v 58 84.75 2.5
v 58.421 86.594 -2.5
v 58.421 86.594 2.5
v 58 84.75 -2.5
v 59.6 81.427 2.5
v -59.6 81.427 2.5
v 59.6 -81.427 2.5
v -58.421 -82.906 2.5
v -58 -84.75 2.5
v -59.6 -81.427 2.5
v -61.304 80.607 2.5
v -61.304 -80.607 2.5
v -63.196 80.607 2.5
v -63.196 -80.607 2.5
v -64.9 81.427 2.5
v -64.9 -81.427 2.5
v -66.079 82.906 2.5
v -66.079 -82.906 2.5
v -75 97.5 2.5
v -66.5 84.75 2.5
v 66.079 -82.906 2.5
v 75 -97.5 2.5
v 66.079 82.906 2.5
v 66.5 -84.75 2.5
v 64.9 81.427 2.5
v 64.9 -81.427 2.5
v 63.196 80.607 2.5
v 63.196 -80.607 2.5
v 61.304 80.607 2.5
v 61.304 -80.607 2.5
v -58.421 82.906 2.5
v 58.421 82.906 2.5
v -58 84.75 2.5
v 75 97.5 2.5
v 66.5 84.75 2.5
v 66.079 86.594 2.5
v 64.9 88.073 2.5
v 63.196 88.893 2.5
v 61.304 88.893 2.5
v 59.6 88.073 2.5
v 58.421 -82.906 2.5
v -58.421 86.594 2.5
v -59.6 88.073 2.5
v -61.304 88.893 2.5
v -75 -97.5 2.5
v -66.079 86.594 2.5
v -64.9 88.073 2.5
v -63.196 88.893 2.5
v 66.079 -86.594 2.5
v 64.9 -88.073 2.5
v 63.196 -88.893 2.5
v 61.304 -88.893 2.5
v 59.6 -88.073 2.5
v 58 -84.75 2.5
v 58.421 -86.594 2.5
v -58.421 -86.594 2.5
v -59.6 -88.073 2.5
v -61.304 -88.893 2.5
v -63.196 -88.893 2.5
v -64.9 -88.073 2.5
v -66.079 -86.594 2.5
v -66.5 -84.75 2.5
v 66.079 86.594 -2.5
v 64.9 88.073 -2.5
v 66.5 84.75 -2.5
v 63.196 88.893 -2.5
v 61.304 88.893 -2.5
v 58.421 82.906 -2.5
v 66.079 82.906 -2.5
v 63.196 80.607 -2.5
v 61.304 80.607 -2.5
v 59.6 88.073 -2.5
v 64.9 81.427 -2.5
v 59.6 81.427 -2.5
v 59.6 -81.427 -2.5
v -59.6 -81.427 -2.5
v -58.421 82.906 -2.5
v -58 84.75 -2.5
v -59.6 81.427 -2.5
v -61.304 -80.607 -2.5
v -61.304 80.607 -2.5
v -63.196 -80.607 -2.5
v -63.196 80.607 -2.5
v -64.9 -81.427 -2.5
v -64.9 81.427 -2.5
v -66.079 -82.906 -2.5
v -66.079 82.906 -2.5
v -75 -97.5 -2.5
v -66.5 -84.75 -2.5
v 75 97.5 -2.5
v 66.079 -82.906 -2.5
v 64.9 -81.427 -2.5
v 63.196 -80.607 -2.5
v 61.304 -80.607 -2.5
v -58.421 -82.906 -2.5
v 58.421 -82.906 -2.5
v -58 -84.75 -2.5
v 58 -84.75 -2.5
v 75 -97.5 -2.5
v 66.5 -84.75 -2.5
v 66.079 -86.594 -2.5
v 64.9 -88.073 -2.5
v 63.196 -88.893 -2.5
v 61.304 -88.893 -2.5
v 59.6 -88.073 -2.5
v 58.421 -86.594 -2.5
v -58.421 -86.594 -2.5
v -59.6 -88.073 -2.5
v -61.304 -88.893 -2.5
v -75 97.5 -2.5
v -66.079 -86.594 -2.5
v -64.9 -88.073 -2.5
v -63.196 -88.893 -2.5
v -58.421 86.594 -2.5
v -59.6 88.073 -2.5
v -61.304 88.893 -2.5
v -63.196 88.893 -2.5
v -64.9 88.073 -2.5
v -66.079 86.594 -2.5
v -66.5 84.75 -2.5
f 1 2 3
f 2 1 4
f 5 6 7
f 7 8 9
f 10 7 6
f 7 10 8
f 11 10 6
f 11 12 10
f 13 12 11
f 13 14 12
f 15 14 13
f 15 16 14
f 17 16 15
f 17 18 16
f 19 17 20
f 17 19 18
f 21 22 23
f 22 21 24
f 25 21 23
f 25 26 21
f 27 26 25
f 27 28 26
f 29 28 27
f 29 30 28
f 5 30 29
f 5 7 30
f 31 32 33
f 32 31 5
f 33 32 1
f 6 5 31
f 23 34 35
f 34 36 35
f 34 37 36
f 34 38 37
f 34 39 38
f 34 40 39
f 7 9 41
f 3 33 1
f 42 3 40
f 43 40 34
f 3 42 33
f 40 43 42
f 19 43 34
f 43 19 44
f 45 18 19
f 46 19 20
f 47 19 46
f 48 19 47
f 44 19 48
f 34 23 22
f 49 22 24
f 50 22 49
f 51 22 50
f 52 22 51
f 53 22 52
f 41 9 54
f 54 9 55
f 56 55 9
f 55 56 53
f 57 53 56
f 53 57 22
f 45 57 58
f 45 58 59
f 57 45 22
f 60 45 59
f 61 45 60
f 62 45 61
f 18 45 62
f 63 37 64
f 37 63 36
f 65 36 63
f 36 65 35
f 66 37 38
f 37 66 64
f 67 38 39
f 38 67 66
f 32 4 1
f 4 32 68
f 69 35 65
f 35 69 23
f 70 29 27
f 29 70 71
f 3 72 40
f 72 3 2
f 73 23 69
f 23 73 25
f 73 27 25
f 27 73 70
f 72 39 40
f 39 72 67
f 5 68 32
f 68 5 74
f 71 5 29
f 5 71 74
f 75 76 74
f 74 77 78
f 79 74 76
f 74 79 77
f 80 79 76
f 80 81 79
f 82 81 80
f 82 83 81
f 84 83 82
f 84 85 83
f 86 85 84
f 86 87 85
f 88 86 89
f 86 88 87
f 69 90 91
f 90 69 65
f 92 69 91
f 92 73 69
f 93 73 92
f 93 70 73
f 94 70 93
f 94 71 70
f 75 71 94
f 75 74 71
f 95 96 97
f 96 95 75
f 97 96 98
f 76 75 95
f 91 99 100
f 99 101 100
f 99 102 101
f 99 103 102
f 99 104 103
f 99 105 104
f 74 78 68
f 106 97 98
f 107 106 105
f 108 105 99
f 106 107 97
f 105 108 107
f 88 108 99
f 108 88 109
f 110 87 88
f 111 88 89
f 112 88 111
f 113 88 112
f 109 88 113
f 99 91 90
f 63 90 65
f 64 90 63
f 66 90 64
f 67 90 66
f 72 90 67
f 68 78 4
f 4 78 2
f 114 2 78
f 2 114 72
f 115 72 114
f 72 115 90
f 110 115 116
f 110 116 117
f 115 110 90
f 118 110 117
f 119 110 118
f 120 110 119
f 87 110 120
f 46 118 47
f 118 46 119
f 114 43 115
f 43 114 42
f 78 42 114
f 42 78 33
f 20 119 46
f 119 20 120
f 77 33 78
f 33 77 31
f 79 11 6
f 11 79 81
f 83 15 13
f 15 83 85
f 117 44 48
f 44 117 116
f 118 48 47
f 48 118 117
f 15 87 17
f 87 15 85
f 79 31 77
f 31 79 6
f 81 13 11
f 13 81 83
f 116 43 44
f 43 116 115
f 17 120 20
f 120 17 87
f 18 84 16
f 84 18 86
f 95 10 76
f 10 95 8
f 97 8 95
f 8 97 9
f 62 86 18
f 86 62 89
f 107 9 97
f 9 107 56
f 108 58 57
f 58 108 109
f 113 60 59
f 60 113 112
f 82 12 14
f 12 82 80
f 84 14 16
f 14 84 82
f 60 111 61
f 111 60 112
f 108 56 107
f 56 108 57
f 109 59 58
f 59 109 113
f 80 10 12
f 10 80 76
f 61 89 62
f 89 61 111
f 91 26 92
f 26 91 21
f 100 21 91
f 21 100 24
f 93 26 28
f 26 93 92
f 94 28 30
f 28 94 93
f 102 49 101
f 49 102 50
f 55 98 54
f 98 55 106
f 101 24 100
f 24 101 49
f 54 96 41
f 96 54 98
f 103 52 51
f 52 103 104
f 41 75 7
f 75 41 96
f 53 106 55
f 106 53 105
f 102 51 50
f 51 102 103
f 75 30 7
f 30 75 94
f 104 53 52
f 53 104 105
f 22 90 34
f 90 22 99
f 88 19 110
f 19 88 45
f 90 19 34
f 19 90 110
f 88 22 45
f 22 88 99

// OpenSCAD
// Generated by SolidPython 1.1.3 on 2024-06-19 00:59:38


difference() {
	cube(center = true, size = [150, 195.0000000000, 5]);
	union() {
		translate(v = [62.2500000000, 84.7500000000]) {
			cylinder(center = true, h = 5, r = 4.2500000000);
		}
		translate(v = [-62.2500000000, 84.7500000000]) {
			cylinder(center = true, h = 5, r = 4.2500000000);
		}
		translate(v = [-62.2500000000, -84.7500000000]) {
			cylinder(center = true, h = 5, r = 4.2500000000);
		}
		translate(v = [62.2500000000, -84.7500000000]) {
			cylinder(center = true, h = 5, r = 4.2500000000);
		}
	}
}
/***********************************************
*********      SolidPython code:      **********
************************************************
 
import solid
import numpy as np
import numbers
import pudb
from solid.utils import *
import viewscad
import subprocess
import os
import os.path as osp
import math
import sys

chamfer_extrude=solid.import_scad("./chamfer_extrude.scad")
chamfer_extrude=chamfer_extrude.chamfer_extrude
r = viewscad.Renderer(width=800, height=800)

def debug(model,f_name,path="/home/ts/code/projects/mfd/designs/debug"):
    solid.scad_render_to_file(model,osp.join(path,f_name)+".scad")
#generate position list of wells using offset from center
wells_pos_from_center_4 = lambda offset: [[-offset,offset],
                                        [offset, offset],
                                        [-offset, -offset],
                                        [offset, -offset]]
wells_pos_from_center_2 = lambda offset: [[offset,0],
                                        [-offset,0]]

def make_well(dims,shape=None,height=None,dxf=False):
    def circle_cylinder():
        if dxf or (height is None):
            well = solid.circle(r=dims, segments=64)
        else:
            well = solid.cylinder(r=dims, h=height, segments=64, center = True)
        return well
    if dims is None:
        sys.exit("radius needs to be a number")
    if isinstance(dims, numbers.Number):
        well =circle_cylinder()
    elif len(dims)==1:
        if isinstance(dims[1], numbers.Number):
            well =circle_cylinder()
        else:
            sys.exit("radius needs to be a number")
    elif len(dims)==2:
        well = solid.square(dims,center = True)
    elif len(dims)==3:
        well = solid.cube(dims, center = True)
    return well

def wells_top_bottom(center_gap,device_dims=None,shape=None,height=None, positions = None, dxf = False,well_shape=None):
    if well_shape == None:
        well_shape = make_well(device_dims,shape=shape,height=height,dxf=dxf)
    wells = []
    if positions is None:
        offset = radius+radius/2.0
        positions = wells_pos_from_center_2(offset)
    if dxf or (height is None):
        height = 0
    for position in positions:
        if dxf:
            wells.append(solid.translate([position[0],position[1]])(well_shape))
        else:
            wells.append(solid.translate([position[0],position[1],height/2.0])(well_shape))
    return  union()(*wells)

#place wells in four corners 
def four_corner(radius,height=None, positions = None, dxf = False):
    #if well pos not specified set
    #to equally spaced by half radius
    if positions is None:
        offset = radius+radius/2.0
        positions = wells_pos_from_center_4(offset)
    if dxf or (height is None):
        height = 0
    #make wells at positions with specified radius and height
    wells = []
    for position in positions:
        #make circle if making dxf
        if dxf:
            well_shape = solid.circle(r=radius, segments=64)
            well_shape = solid.translate([position[0],position[1]])(well_shape)
        #if stl make cylinder
        else:
            well_shape = solid.cylinder(r=radius, h=height, segments=64, center = True)
            well_shape = solid.translate([position[0],position[1],height/2.0])(well_shape)
        wells.append(well_shape)
    return  union()(*wells)

#generate channels 
def make_channels(length,width,height=0,num_chans=1,max_chans=None,spacing=None, dxf = False,
                  rotate_channels=False):
    if dxf or (height is None):
        height = 0
    #if channel gap not defined, is equal to
    if spacing is None: spacing = width
    #calculate number of channels if fitting max num within given width
    if not max_chans is None:
        import math
        num_chans = math.floor((max_chans-spacing)/(width+spacing))
    #get total width of channel section  
    total_width = (width*num_chans)+(spacing*(num_chans-1))

    #make template channel
    #if rotate_channels: width, length = length, width
    if dxf:
        channel_t = solid.square([length,width],center = True)
    else:
        channel_t = solid.cube([length,width,height], center = True)

    #if number channels is even, offset the first channel to center its gap
    if num_chans % 2 == 0: centering = -(width/2.0+spacing/2.0)
    else: centering = 0
    #move template channel up to align bottom at z = 0 
    #and offset center if necessary
    if dxf:
        channel_t = solid.translate([0,centering])(channel_t)
    else:
        channel_t = solid.translate([0,centering,height/2.0])(channel_t)

    #if rotate_channels: length,width = width,length
    #start making the channels
    channels = []
    for i in range(num_chans):
        #if i=0 there is no translation
        #if i=1, we make the first channel adjacent to second
        direction = i

        #if i>=1, we add channels alternating left and right
        if i >= 1:
            direction = -(i/2.0)
            if i % 2 == 1: direction = (-direction)+0.5
                
        #make channel at right position and add it to channel list
        translation_coords = [0,direction*(width+spacing)]
        #if rotate_channels: translation_coords = [direction*(width+spacing),0]
        if dxf:
            channel = solid.translate(translation_coords)(channel_t)
        else:
            channel = solid.translate([*translation_coords,0])(channel_t)
        channels.append(channel)
    
    #group all channels as one object
    channels = union()(*channels)
    #compute the x,y,z dimensions in order to pass as arguments 
    #for construction of other parts of device (such as the chambers)
    measurements = {'x':(length/2.0,-length/2.0),
                    'y':(total_width/2.0,-total_width/2.0)}
    if not dxf:
        measurements['z'] = (height,0)
    if rotate_channels:
        channels = solid.rotate(90)(channels)
        measurements['x'],measurements['y']=measurements['y'],measurements['x']
    return channels,measurements

def make_chambers(msrs,height=None,extra=0,len_until=None,width=None, dxf = False):
    #computes x,y,z length
    total = lambda x : abs(x[0]) + abs(x[1])
    
    #if specific height if specified
    #otherwise use same height as channels
    if dxf:
        pass
    elif not height is None:
        msrs['z'] = (height,0)
    else:
        msrs['z'] = (0,0)
        
    #make copy of measurements from channels to modify chamber dimensions 
    #and add length to chambers as specified
    chamber_dims = msrs.copy()
    #calculate length of chamber to reach specified offset
    if not len_until is None:
        chamber_len = len_until-(msrs['x'][0])
    #or add specified length to channel length (if not specified, adds 0)
    else:
        chamber_len = msrs['x'][0]+extra
    #set the chamber length based 
    chamber_dims['x'] = (chamber_len/2.0,-(chamber_len/2.0))
    #compute final dimensions of chamber
    if not width is None:
        chamber_dims['y'] = (width/2.0,-width/2.0)
    chamber_dims = [total(size) for size in chamber_dims.values()]
        
    #calculate chamber translation offset to place adjacent to channels
    chamber_trslt = msrs['x'][0]+(chamber_len/2.0)
    #compute chamber translation coordinates to align with channels
    #x = 1 moves chamber above channels
    #x = -1 moves chamber below channels
    if dxf:
        trslt = lambda x : [x*(chamber_trslt),0]
    else:
        trslt = lambda x : [x*(chamber_trslt),0,msrs['z'][0]/2.0]
    
    #function to make chamber at top or at bottom 
    if dxf:
        move = lambda x : solid.translate(trslt(x))(solid.square(chamber_dims, center = True) )
    else:
        move = lambda x : solid.translate(trslt(x))(solid.cube(chamber_dims,center = True))
    #make top and bottom chambers and return them as grouped
    top = move(1)
    bottom = move(-1)
    #chambers=solid.rotate(90)(solid.union()(top,bottom))
    chambers=(solid.union()(top,bottom))

    return chambers

#create alignment features 
def alignment_features(unit,dims,grid_size, mask_size = None, alignment = "hollow", units_from_center = (2.5,2.5), corner_len=None):
    width = grid_size[0]*dims[0]
    length = grid_size[1]*dims[1]
    if mask_size is None and corner_len is None:
        corner_len = (dims[0] + dims[1]) /2 / 8
    corner = lambda thickness_div : solid.union()( solid.square([corner_len,corner_len/thickness_div],center=False), solid.square([corner_len/thickness_div,corner_len],center=False) )
    
    def make_full(thickness_div):
        thickness = corner_len/thickness_div
        tr = solid.translate([0, 0, 0 ])(solid.rotate(180)(corner(thickness_div)))
        tr = solid.translate([thickness/2,thickness/2,0])(tr)
        bl = solid.translate([0, 0, 0 ])(solid.rotate(0)(corner(thickness_div)))
        bl = solid.translate([-thickness/2,-thickness/2,0])(bl)
        return solid.union()(tr,bl)
    
    def make_hollow(thickness_div):
        thickness = corner_len/(thickness_div/2)
        inner = make_full(thickness_div)
        outer = make_full(thickness_div/2)
        hollow = outer - inner 
        return hollow
    
    center = (width /2 , length/2)
    mask_pos = lambda x,y : (center[0] + x*(float(units_from_center[0])*dims[0]), center[1] + y*(float(units_from_center[1])*dims[1]))
    positions = []
    positions.append(mask_pos(1,0))
    positions.append(mask_pos(0,1))
    positions.append(mask_pos(-1,0))
    positions.append(mask_pos(0,-1))
    make_mask = lambda mtype : make_hollow(8) if mtype == "hollow" else make_full(8)
    masks = [ solid.translate([*position,0])(make_mask(alignment)) for position in positions]
    
    solid.scad_render_to_file(solid.union()(*masks),"./designs/open_chamber/masks.scad")
    #return unit - solid.union()(*masks)
    return solid.union()(*masks,unit)

def create_outline(thickness, array, dims, grid_size,):
    width = grid_size[0]*dims[0] + thickness *2
    length = grid_size[1]*dims[1] + thickness *2
    outer = solid.translate([-thickness, -thickness,0])(solid.square([width, length]))
    return outer-array

def create_wall(wall_thickness, outline_thickness, dims, grid_size, wall_height = 2000, dxf = False):
    inner_width = grid_size[0]*dims[0] + outline_thickness *2
    inner_length = grid_size[1]*dims[1] + outline_thickness *2
    outer_width = inner_width + wall_thickness * 2
    outer_length = inner_length + wall_thickness * 2
    outer_pos_x = -outline_thickness-wall_thickness
    outer_pos_y = -outline_thickness-wall_thickness
    inner_pos_x = -outline_thickness
    inner_pos_y = -outline_thickness
    if dxf:
        inner_wall = solid.translate([inner_pos_x,
                                      inner_pos_y,
                                      0])(solid.square([inner_width, inner_length]))
        outer_wall = solid.translate([outer_pos_x,
                                      outer_pos_y,
                                      0])(solid.square([outer_width, outer_length]))

        return outer_wall-inner_wall
    else:
        inner_wall = solid.translate([inner_pos_x,
                                      inner_pos_y,
                                      0])(solid.cube([inner_width, inner_length,wall_height]))
        outer_wall = solid.translate([outer_pos_x,
                                      outer_pos_y,
                                      0])(solid.cube([outer_width, outer_length,wall_height]))

        return outer_wall-inner_wall, {'wall_height': wall_height,
                                       'wall_thickness': wall_thickness,
                                       'inner_width':inner_width,
                                       'inner_length': inner_length,
                                       'outer_width': outer_width,
                                       'outer_length': outer_length,
                                       'outer_pos_x' : outer_pos_x,
                                       'outer_pos_y' : outer_pos_y,
                                       'inner_pos_x' : inner_pos_x,
                                       'inner_pos_y' : inner_pos_y}

def create_thicker_wall(wall_thickness, outer_wall_offset, wall_dims, dims, grid_size, height_start = .2, height_end=2, dxf = False):
    addon_wall,thicker_wall_dims = create_wall(wall_thickness, outer_wall_offset, dims, grid_size, wall_height=height_end-height_start, dxf = False)
    addon_wall = solid.translate([0,0,height_start])(addon_wall)

    thicker_wall_dims['wall_height'] = height_end
    thicker_wall_dims['wall_thickness'] = wall_dims['wall_thickness'] + wall_thickness
    return addon_wall, thicker_wall_dims
 
def add_lock_to_wall(wall,wall_dims,y_offset = 0,cut_ratio=0.7,L_length=3, gap_ratio=0.05, axis="x",width_ratio=1/2):
    # Makes L shape
    def make_L(max_length,length_thickness,max_width,width_thickness,height,y_offset):
        length = solid.cube([max_length,length_thickness,height])
        width = solid.cube([width_thickness,max_width,height])
        width = solid.translate([max_length-(width_thickness),0,0])(width)
        L = solid.union()(width,length)
        debug(L,"L")
        if axis == "x":
            L = solid.rotate(-90)(L)
            L = solid.translate([0,max_length,0])(L)
        else:
            L = solid.rotate(-180)(L)
            L = solid.translate([max_length,max_width,0])(L)
        return solid.translate([0,0,y_offset])(L)
    
    lock_length = L_length
    lock_width = wall_dims['wall_thickness']*width_ratio
    lock_length_thickness = lock_width/2
    lock_width_thickness = lock_width/2
    L_lock = make_L(lock_length,lock_length_thickness,lock_width,lock_width_thickness, wall_dims['wall_height']-y_offset, y_offset)
    
    margin_space = lock_length - lock_length*(1-gap_ratio)
    key_length = lock_length-margin_space
    key_length_thickness = lock_length_thickness-(margin_space*2)
    key_width = lock_width-(margin_space*2)
    key_width_thickness = lock_width_thickness-(margin_space*2)
    L_key = make_L(key_length,key_length_thickness,key_width,key_width_thickness, wall_dims['wall_height']-y_offset, y_offset)
    L_key = solid.translate([margin_space,margin_space,0])(L_key)
    L = solid.union()(L_lock,L_key)
    debug(L,"L")
    
    #Make cube to be used as negative to split frame in a half
    #Can choose if making left or right negative, specify ratio of split
    def make_negative(right,cut_ratio):
        if axis == "x":
            if right:
                length = wall_dims['outer_length']*(1-cut_ratio)
                pos_x = wall_dims['outer_pos_x']+(wall_dims['outer_length']*cut_ratio)
            else:
                length = wall_dims['outer_length']*(cut_ratio)
                pos_x = wall_dims['outer_pos_x'] 
            negative = solid.cube([wall_dims['outer_width'],length, wall_dims['wall_height']])
            negative = solid.translate([wall_dims['outer_pos_y'],pos_x,0])(negative)
        else:
            if right:
                length = wall_dims['outer_width']*(1-cut_ratio)
                pos_x = wall_dims['outer_pos_y']+(wall_dims['outer_width']*cut_ratio)
            else:
                length = wall_dims['outer_width']*(cut_ratio)
                pos_x = wall_dims['outer_pos_y'] 
            negative = solid.cube([length,wall_dims['outer_length'], wall_dims['wall_height']])
            negative = solid.translate([pos_x,wall_dims['outer_pos_x'],0])(negative)
        return negative, pos_x, length 
                      
    #Make negatives
    negative_right, right_half_pos_x, right_half_length = make_negative(True,cut_ratio)
    negative_left, left_half_pos_x, right_half_length = make_negative(False,cut_ratio)
    #Make halves
    left_half = solid.difference()(wall,negative_right)
    right_half = solid.difference()(wall,negative_left)
    def place_L(L, L_length,L_width):
        #Place L on top wall       
        offset_to_center = (wall_dims['wall_thickness']-L_width)/2
        if axis == "x":
            y_pos_top = (wall_dims['outer_pos_y'] +
                    wall_dims['outer_width'] - 
                    L_width - offset_to_center)
            top_L = solid.translate([y_pos_top,
                                     right_half_pos_x-(L_length),
                                     0])(L)
            #Place L on bottom wall       
            y_pos_bottom = wall_dims['outer_pos_y']+offset_to_center
            bottom_L = solid.translate([y_pos_bottom,
                                        right_half_pos_x-L_length,
                                        0])(L)
        else:
            y_pos_top = (wall_dims['outer_pos_x'] +
                    wall_dims['outer_length'] -
                    (L_width+offset_to_center))
            top_L = solid.translate([right_half_pos_x-L_length,
                                     y_pos_top,
                                     0])(L)
            #Place L on bottom wall       
            y_pos_bottom = wall_dims['outer_pos_y']+offset_to_center
            bottom_L = solid.translate([right_half_pos_x-L_length,
                                        y_pos_bottom,
                                        0])(L)
        return bottom_L, top_L
    #Make complimentary L pieces through union and differences
    #Make Lock
    bottom_L_lock, top_L_lock = place_L(L_lock,L_length,lock_width)
    left_half = solid.difference()(left_half,bottom_L_lock)
    left_half = solid.difference()(left_half,top_L_lock)
    #Make Key
    bottom_L_key, top_L_key = place_L(L_key,L_length,lock_width)
    right_half = solid.union()(right_half,bottom_L_key)
    right_half = solid.union()(right_half,top_L_key)
    return left_half, right_half


#build a row x col grid of containment units
def make_unit_array(unit,dims,grid_size, dxf = False, alignment = None, mask_size = None,
                    units_from_center = None,alignment_offset=None, alignment_mark_size=1):
    units = []
    for col in range(grid_size[1]):
        for row in range(grid_size[0]):
            if dxf:
                units.append(solid.translate([row*dims[0],col*dims[1]])(unit))
            else:
                units.append(solid.translate([row*dims[0],col*dims[1],dims[2]/2.0])(unit))
    array = solid.union()(*units)
    if (not alignment is None) and dxf:
        if not alignment_offset is None:
            array = solid.translate([alignment_offset[0],alignment_offset[1]])(array)
        array = alignment_features(array,dims, grid_size, alignment = alignment, mask_size = None, units_from_center = units_from_center,corner_len=alignment_mark_size)
        if not alignment_offset is None:
            array = solid.translate([-alignment_offset[0],-alignment_offset[1]])(array)
    return array


def make_taylor(wells_pos = wells_pos_from_center_4(2.25), well_rad = 1.5 ,
                well_height = 2, chan_w = 0.01, chan_l = 1, chan_h = 0.010 ,
                chan_gap = 0.040, max_chans = None,num_chans=100, chamber_height  = 0.100,
                columns = 1, rows = 1, chamber_len_until=2.25, add_channels = True, add_wells = True, 
                add_chambers = True, save_path = "./", alignment = None, units_from_center = 2,
                mask_size = None, render_stl = False, outline_thickness = 0.050, dxf = True,
                wall_height = 15, wall_thickness = 0.95, casing_x=9, casing_y=9, casing_z=0,rotate_units=0):

    dims = [casing_x, casing_y, casing_z]
    wells = four_corner(well_rad,well_height, dxf = dxf, positions = wells_pos)
    debug(wells,"wells")
    channels, msrs = make_channels(chan_l,chan_w,chan_h,dxf=dxf, spacing = chan_gap, max_chans=max_chans,num_chans=num_chans)
    debug(channels,"channels")
    chambers = make_chambers(msrs,dxf = dxf, height=chamber_height,len_until=chamber_len_until)
    debug(chambers,"chambers")

    #add together and render
    device_parts = []
    if add_channels:
        device_parts.append(channels)
    if add_wells:
        device_parts.append(wells)
    if add_chambers:
        device_parts.append(chambers)
    device=union()(*device_parts)
    device = rotate(rotate_units)(device)

    device=solid.translate([dims[0]/2.0,dims[1]/2.0,0])(device)
    channels = rotate(rotate_units)(channels)
    channels=solid.translate([dims[0]/2,dims[1]/2,0])(channels)
    chambers_wells = union()(wells,chambers)
    chambers_wells = rotate(rotate_units)(chambers_wells)
    chambers_wells=solid.translate([dims[0]/2,dims[1]/2,0])(chambers_wells)

    file_name = str(rows)+'x'+str(columns)+'_units_'
    grid_size = [rows,columns]

    if alignment:
        alignment="full"
    device = make_unit_array(device,dims,grid_size, dxf=dxf, alignment = alignment,
                                 units_from_center = units_from_center)
    channels = make_unit_array(channels,dims,grid_size, dxf=dxf, alignment = alignment,
                                 units_from_center = units_from_center)
    if alignment=="full":
        alignment="hollow"

    chambers_wells = make_unit_array(chambers_wells,dims,grid_size, dxf=dxf, alignment = alignment,
                                 units_from_center =units_from_center)

    def save_model(model,prefix):
        model_fname = os.path.abspath(save_path+prefix+"_"+file_name+".scad")
        solid.scad_render_to_file(model,model_fname)
        return model_fname

    wells_fname = save_model(wells,"wells")
    channels_fname = save_model(channels,"channels")
    device_fname = save_model(device,"device")
    chambers_wells_fname = save_model(chambers_wells,"chambers_wells")
    return (chambers_wells,chambers_wells_fname), (channels,channels_fname), (device,device_fname)

def make_device(design='open',rows=8,columns=6,wells_pos = 4.5,well_offset=3.2, well_rad=3.2,well_height=0.1,
                chan_l=1,chan_w=0.01,chan_h=0.01,chan_gap=0.015,num_chans=101,dxf=True,save_path="./designs/open_chamber/",
                casing_x=9.0,casing_y=18.0,casing_z=0,rotate_units=90,units_from_center=(3,1),chamber_len_until=4.5,
                chamber_width=None,alignment=True, add_wells=True, add_channels=True,add_chambers=True,well_shape=None):

    dims = [casing_x, casing_y, casing_z]
    if design == "open":
        wells_pos=wells_pos_from_center_2(wells_pos)
        wells = wells_top_bottom(well_offset*2,device_dims=well_rad,height=well_height, dxf = dxf, positions = wells_pos,well_shape=well_shape)
    elif design == "closed":
        wells_pos=wells_pos_from_center_4(wells_pos)
        debug(wells,"wells")
        wells = four_corner(well_offset,well_height,device_dims=well_rad, dxf = dxf, positions = wells_pos)
    else:
        print(design+" is not a valid design.\n Choose valid design: 'open' or 'closed'")
        exit()
    wells = rotate(rotate_units)(wells)
    wells=solid.translate([dims[0]/2,dims[1]/2,0])(wells)
    debug(wells,"wells")

    channels, msrs = make_channels(chan_l,chan_w,chan_h,dxf=dxf, spacing = chan_gap, num_chans=num_chans,rotate_channels=False)
    channels = rotate(rotate_units)(channels)
    channels=solid.translate([dims[0]/2,dims[1]/2,0])(channels)

    chambers=make_chambers(msrs,height=None,extra=0,len_until=chamber_len_until, width=chamber_width,dxf = dxf)
    chambers = rotate(rotate_units)(chambers)
    chambers=solid.translate([dims[0]/2,dims[1]/2,0])(chambers)

    device_parts = []
    if add_channels:
        device_parts.append(channels)
    if add_wells:
        device_parts.append(wells)
    if add_chambers:
        device_parts.append(chambers)
    device = union()(*device_parts)
    #device = rotate(rotate_units)(device)
    #device=solid.translate([dims[0]/2.0,dims[1]/2.0,0])(device)

    chambers_wells = []
    if add_chambers:
        chambers_wells.append(chambers)
    if add_wells:
        chambers_wells.append(wells)
    chambers_wells = union()(*chambers_wells)
    #chambers_wells = union()(wells,chambers)
    #chambers_wells = rotate(rotate_units)(chambers_wells)
    #chambers_wells=solid.translate([dims[0]/2,dims[1]/2,0])(chambers_wells)

    file_name = str(rows)+'x'+str(columns)+'_units_'

    grid_size = [rows,columns]
    if alignment:
        alignment="full"
    device = make_unit_array(device,dims,grid_size, dxf=dxf, alignment = alignment,
                                 units_from_center = units_from_center)
    channels = make_unit_array(channels,dims,grid_size, dxf=dxf, alignment = alignment,
                                 units_from_center = units_from_center)
    if alignment=="full":
        alignment="hollow"

    chambers_wells = make_unit_array(chambers_wells,dims,grid_size, dxf=dxf, alignment = alignment,
                                 units_from_center =units_from_center)

    def save_model(model,prefix):
        model_fname = os.path.abspath(save_path+prefix+"_"+file_name+".scad")
        solid.scad_render_to_file(model,model_fname)
        return model_fname

    wells_fname = save_model(wells,"wells")
    channels_fname = save_model(channels,"channels")
    device_fname = save_model(device,"device")
    chambers_wells_fname = save_model(chambers_wells,"chambers_wells")
    return (chambers_wells,chambers_wells_fname), (channels,channels_fname), (device,device_fname)


def make_open_chamber(rows=8,columns=6,wells_pos = wells_pos_from_center_2(4.5), well_rad=3.2,well_height=0.1,
                      chan_l=1,chan_w=0.01,chan_h=0.01,chan_gap=0.015,num_chans=101,dxf=True,save_path="./designs/open_chamber/",
                      casing_x=9.0,casing_y=18.0,casing_z=0,rotate_units=90,units_from_center=(3,1),chamber_len_until=4.5,
                      chamber_width=None,alignment=True, add_wells=True, add_channels=True,add_chambers=True,well_shape=None):

    dims = [casing_x, casing_y, casing_z]
    wells = wells_top_bottom(well_rad,height=well_height, dxf = dxf, positions = wells_pos, well_shape=well_shape)
    channels, msrs = make_channels(chan_l,chan_w,chan_h,dxf=dxf, spacing = chan_gap, num_chans=num_chans,rotate_channels=False)
    chambers=make_chambers(msrs,height=None,extra=0,len_until=chamber_len_until, width=chamber_width,dxf = dxf)
    debug(chambers,"chambers")
    device_parts = []
    if add_channels:
        device_parts.append(channels)
    if add_wells:
        device_parts.append(wells)
    if add_chambers:
        device_parts.append(chambers)
    device = union()(*device_parts)
    device = rotate(rotate_units)(device)
    device=solid.translate([dims[0]/2.0,dims[1]/2.0,0])(device)
    channels = rotate(rotate_units)(channels)
    channels=solid.translate([dims[0]/2,dims[1]/2,0])(channels)
    chambers_wells = union()(wells,chambers)
    chambers_wells = rotate(rotate_units)(chambers_wells)
    chambers_wells=solid.translate([dims[0]/2,dims[1]/2,0])(chambers_wells)

    file_name = str(rows)+'x'+str(columns)+'_units_'

    grid_size = [rows,columns]
    if alignment:
        alignment="full"
    device = make_unit_array(device,dims,grid_size, dxf=dxf, alignment = alignment,
                                 units_from_center = units_from_center)
    channels = make_unit_array(channels,dims,grid_size, dxf=dxf, alignment = alignment,
                                 units_from_center = units_from_center)
    if alignment=="full":
        alignment="hollow"

    chambers_wells = make_unit_array(chambers_wells,dims,grid_size, dxf=dxf, alignment = alignment,
                                 units_from_center =units_from_center)

    def save_model(model,prefix):
        model_fname = os.path.abspath(save_path+prefix+"_"+file_name+".scad")
        solid.scad_render_to_file(model,model_fname)
        return model_fname

    wells_fname = save_model(wells,"wells")
    channels_fname = save_model(channels,"channels")
    device_fname = save_model(device,"device")
    chambers_wells_fname = save_model(chambers_wells,"chambers_wells")
    return (chambers_wells,chambers_wells_fname), (channels,channels_fname), (device,device_fname)

def to_dxf(scad_path):
    dxf_path = scad_path.replace(".scad",".dxf")
    subprocess.call(["openscad", "-o", dxf_path, scad_path])
    import ezdxf
    temp_dxf = ezdxf.readfile(dxf_path)
    temp_dxf.saveas(dxf_path)

#def make_walls(diameter,thickness,grid_size,dims,height=20,segments=256,make_inner=True):
#    wafer_wall_out = solid.cylinder(r=diameter/2,h=height, segments=segments)
#    wafer_wall_in = solid.cylinder(r=(diameter/2-thickness),h=height, segments=segments)
#    wafer_wall = solid.difference()(wafer_wall_out,wafer_wall_in)
#    wafer_wall = solid.translate([grid_size[1]*dims[1]/2.0,grid_size[0]*dims[0]/2.0])(wafer_wall)
#
#    vertical_wall_length = grid_size[1]*dims[1]
#    horizontal_wall_length = grid_size[0]*dims[0]
#    vertical_wall = solid.cube([vertical_wall_length,thickness,height],center = True)
#    vertical_wall = solid.translate([vertical_wall_length/2,0,height/2])(vertical_wall)
#    horizontal_wall = solid.cube([thickness,horizontal_wall_length,height],center = True)
#    horizontal_wall = solid.translate([0,vertical_wall_length/2,height/2])(horizontal_wall)
#    walls = []
#    walls.append(horizontal_wall)
#    walls.append(vertical_wall)
#    for col in range(grid_size[1]):
#        if col == grid_size[1]-1: 
#            walls.append(solid.translate([0,(col+1)*dims[1]])(vertical_wall))
#        elif col > 0 and col < grid_size[1]-1 and make_inner==True:
#            walls.append(solid.translate([0,(col+1)*dims[1]])(vertical_wall))
#    for row in range(grid_size[0]):
#        if row == grid_size[0]-1: 
#            walls.append(solid.translate([(row+1)*dims[0],0])(horizontal_wall))
#        elif row > 0 and row < grid_size[0]-1 and make_inner==True:
#            walls.append(solid.translate([(row+1)*dims[0],0])(horizontal_wall))
#    walls = union()(*walls)
#    wafer_walls = union()(walls,wafer_wall)
#    return walls,wafer_wall,wafer_walls

def make_walls(diameter,thickness,grid_size,dims,height=20,segments=256,make_inner=True,padx=0,pady=0):
    wafer_wall_out = solid.cylinder(r=diameter/2,h=height, segments=segments)
    wafer_wall_in = solid.cylinder(r=(diameter/2-thickness),h=height, segments=segments)
    wafer_wall = solid.difference()(wafer_wall_out,wafer_wall_in)
    wafer_wall = solid.translate([grid_size[1]*dims[1]/2.0,grid_size[0]*dims[0]/2.0])(wafer_wall)

    vertical_wall_length = grid_size[0]*dims[0]+padx
    horizontal_wall_length = grid_size[1]*dims[1]+pady
    vertical_wall = solid.cube([vertical_wall_length,thickness,height],center = True)
    vertical_wall = solid.translate([vertical_wall_length/2-pady/2,-padx/2,height/2])(vertical_wall)
    horizontal_wall = solid.cube([thickness,horizontal_wall_length,height],center = True)
    horizontal_wall = solid.translate([-pady/2,horizontal_wall_length/2-padx/2,height/2])(horizontal_wall)
    walls = []
    walls.append(horizontal_wall)
    walls.append(vertical_wall)
    for col in range(grid_size[1]):
        if col == grid_size[1]-1: 
            walls.append(solid.translate([0,(col+1)*dims[1]+pady])(vertical_wall))
        elif col > 0 and col < grid_size[1]-1 and make_inner==True:
            walls.append(solid.translate([0,(col+1)*dims[1]])(vertical_wall))
    for row in range(grid_size[0]):
        if row == grid_size[0]-1: 
            walls.append(solid.translate([(row+1)*dims[0]+padx,0])(horizontal_wall))
        elif row > 0 and row < grid_size[0]-1 and make_inner==True:
            walls.append(solid.translate([(row+1)*dims[0],0])(horizontal_wall))
    walls = union()(*walls)
    wafer_walls = union()(walls,wafer_wall)
    return walls,wafer_wall,wafer_walls

def save_model(model,base_path,base_name,dxf=True):
    if not os.path.exists(base_path):
        os.makedirs(base_path)
    dxf_path=osp.join(base_path,base_name+".scad")
    solid.scad_render_to_file(model,osp.join(dxf_path))
    if dxf:
        to_dxf(dxf_path)

def make_wafer(diameter,flat_len,thickness):
    wafer = solid.cylinder(r1=diameter/2,r2=diameter/2,h=thickness,segments=512,)()
    x_start_flat=(flat_len/2)
    y_start_flat = math.sqrt(((diameter/2)**2) - (x_start_flat**2) )
    height_delete_flat=diameter/2-y_start_flat
    flat_delete = solid.cube([flat_len,height_delete_flat,thickness],center=False)()
    flat_delete = solid.translate([-flat_len/2,y_start_flat,0])(flat_delete)
    wafer = solid.difference()(wafer,flat_delete)
    wafer = solid.rotate(90)(wafer)
    return wafer

def add_wafer_to_mask(wafer_size,flat_len,mask,grid_size,dims,wafer_line_thickness=0.1,outer_mask_thickness=5,alignment_offset=None):
    def make_wafer_mask(wafer_size,flat_len):
        wafer_mask = make_wafer(wafer_size,flat_len,1)
        wafer_mask = solid.projection()(wafer_mask)
        wafer_mask = solid.translate([grid_size[0]*dims[0]/2.0,grid_size[1]*dims[1]/2.0])(wafer_mask)
        if not alignment_offset is None:
            wafer_mask = solid.translate([-alignment_offset[0],-alignment_offset[1]])(wafer_mask)
        return wafer_mask

    inner_wafer_line_mask = make_wafer_mask(wafer_size-wafer_line_thickness/2,flat_len)
    outer_wafer_line_mask = make_wafer_mask(wafer_size+wafer_line_thickness/2,flat_len)
    outer_wafer_mask = make_wafer_mask(wafer_size+outer_mask_thickness,flat_len)
    outer_wafer_mask = solid.difference()(outer_wafer_mask,outer_wafer_line_mask)
    wafer_mask = solid.union()(outer_wafer_mask,inner_wafer_line_mask)

    return solid.difference()(wafer_mask,mask)

def make_posts(post_shape,post_height):
    posts = solid.linear_extrude(height=post_height)(post_shape)
    return posts

def make_wafer_empty(diameter,flat_len,thickness,margin,notch_len=20,notch_height=5,oversize=1.01):
    diameter*=oversize
    flat_len*=oversize
    wafer = make_wafer(diameter,flat_len,thickness)
    holder = solid.cylinder(r1=diameter/2+margin,r2=diameter/2+margin,h=thickness,segments=512)()
    holder = solid.difference()(holder,wafer)

    x_start_flat=(flat_len/2)
    y_start_flat = math.sqrt(((diameter/2)**2) - (x_start_flat**2) )
    height_delete_flat=diameter/2-y_start_flat
    notch = solid.cube([notch_len,notch_height,thickness],center=False)()
    notch = solid.translate([-notch_len/2,y_start_flat,0])(notch)
    notch = solid.rotate(90)(notch)
    return solid.difference()(holder,notch)

def wafer_print_calibration(diameter,thickness,height,z_offset):
    circles = []
    radii = []
    radii.append(diameter/2.0*0.8)
    radii.append(diameter/2.0*0.6)
    radii.append(diameter/2.0*0.4)
    radii.append(diameter/2.0*0.2)
    for radius in radii:
        inner = solid.cylinder(r1=radius-(thickness/2.0),r2=radius-(thickness/2.0),h=thickness,segments=512,)()
        outer = solid.cylinder(r1=radius+(thickness/2.0),r2=radius+(thickness/2.0),h=thickness,segments=512,)()
        diff = solid.difference()(outer,inner)
        circles.append(diff)
    circles = solid.union()(*circles)
    circles = solid.translate([0,0,z_offset])(circles)
    return circles

def make_rack(wells,dims,grid_size,alignment_offset,rack_x,rack_y,rack_thickness,bolt_width,add_bolts=True):

    #get X and Y dimensions of gride of pipette tips
    X_len = dims[0]*grid_size[0]
    Y_len = dims[1]*grid_size[1]
    #make rack
    rack = solid.cube([rack_x,rack_y,rack_thickness],center=True)

    if add_bolts:
    #add bolt holes
        bolt_hole=solid.cylinder(r=bolt_width/2,h=rack_thickness,center=True)()
        bolt_holes = []
        bolt_holes.append(solid.translate([rack_x/2-1.5*bolt_width,rack_y/2-1.5*bolt_width])(bolt_hole))
        bolt_holes.append(solid.translate([-rack_x/2+1.5*bolt_width,rack_y/2-1.5*bolt_width])(bolt_hole))
        bolt_holes.append(solid.translate([-rack_x/2+1.5*bolt_width,-rack_y/2+1.5*bolt_width])(bolt_hole))
        bolt_holes.append(solid.translate([rack_x/2-1.5*bolt_width,-rack_y/2+1.5*bolt_width])(bolt_hole))
        bolt_holes = solid.union()(*bolt_holes)
        rack=solid.difference()(rack,bolt_holes)
    rack_support = rack

    #center rack with pipette holes
    rack = solid.translate([0,0,rack_thickness/2])(rack)
    rack = solid.translate([X_len/2,Y_len/2])(rack)
    rack = solid.translate([-alignment_offset[0],-alignment_offset[1]])(rack)
    wells = solid.linear_extrude(height=rack_thickness)(wells)
    rack = solid.difference()(rack,wells)
    return rack, rack_support

def make_pillar(wells,dims,grid_size,alignment_offset,rack_x,rack_y,pillar_height,rack_thickness,bolt_width,add_bolts=True,taper_angle=1,bolt_position_corner=1.5):

    #get X and Y dimensions of gride of pipette tips
    X_len = dims[0]*grid_size[0]
    Y_len = dims[1]*grid_size[1]
    #make rack
    rack = solid.cube([rack_x,rack_y,rack_thickness],center=True)
    
    if add_bolts:
    #add bolt holes
        bolt_hole=solid.cylinder(r=bolt_width/2,h=rack_thickness,center=True)()
        bolt_holes = []
        bolt_holes.append(solid.translate([rack_x/2-bolt_position_corner*bolt_width,rack_y/2-bolt_position_corner*bolt_width])(bolt_hole))
        bolt_holes.append(solid.translate([-rack_x/2+bolt_position_corner*bolt_width,rack_y/2-bolt_position_corner*bolt_width])(bolt_hole))
        bolt_holes.append(solid.translate([-rack_x/2+bolt_position_corner*bolt_width,-rack_y/2+bolt_position_corner*bolt_width])(bolt_hole))
        bolt_holes.append(solid.translate([rack_x/2-bolt_position_corner*bolt_width,-rack_y/2+bolt_position_corner*bolt_width])(bolt_hole))
        bolt_holes = solid.union()(*bolt_holes)
        rack=solid.difference()(rack,bolt_holes)
    rack_support = rack

    #center rack with pipette holes
    #rack = solid.translate([0,0,-rack_thickness])(rack)
    rack = solid.translate([X_len/2,Y_len/2])(rack)
    rack = solid.translate([-alignment_offset[0],-alignment_offset[1]])(rack)
    if not taper_angle == 0:
        wells=chamfer_extrude(pillar_height,taper_angle,segments=20)(wells)
    else:
        wells = solid.linear_extrude(height=pillar_height)(wells)
    rack = solid.union()(rack,wells)
    return rack, rack_support

def deg_taper_len(height,deg):
    if not deg == 0:
        return height*math.tan(math.radians(deg))
    else:
        return 0

def make_outline(inner_dims,wall_thickness,grid_size,dims,alignment_offset):
    inner_dims=np.array(inner_dims)
    inner_outline=solid.square(inner_dims,center=True)
    outer_dims=inner_dims+wall_thickness
    outer_outline=solid.square(outer_dims,center=True)
    outline=solid.difference()(outer_outline,inner_outline)
    outline=solid.translate([grid_size[0]*dims[0]/2.0,grid_size[1]*dims[1]/2.0])(outline)
    return outline








 
 
************************************************/
